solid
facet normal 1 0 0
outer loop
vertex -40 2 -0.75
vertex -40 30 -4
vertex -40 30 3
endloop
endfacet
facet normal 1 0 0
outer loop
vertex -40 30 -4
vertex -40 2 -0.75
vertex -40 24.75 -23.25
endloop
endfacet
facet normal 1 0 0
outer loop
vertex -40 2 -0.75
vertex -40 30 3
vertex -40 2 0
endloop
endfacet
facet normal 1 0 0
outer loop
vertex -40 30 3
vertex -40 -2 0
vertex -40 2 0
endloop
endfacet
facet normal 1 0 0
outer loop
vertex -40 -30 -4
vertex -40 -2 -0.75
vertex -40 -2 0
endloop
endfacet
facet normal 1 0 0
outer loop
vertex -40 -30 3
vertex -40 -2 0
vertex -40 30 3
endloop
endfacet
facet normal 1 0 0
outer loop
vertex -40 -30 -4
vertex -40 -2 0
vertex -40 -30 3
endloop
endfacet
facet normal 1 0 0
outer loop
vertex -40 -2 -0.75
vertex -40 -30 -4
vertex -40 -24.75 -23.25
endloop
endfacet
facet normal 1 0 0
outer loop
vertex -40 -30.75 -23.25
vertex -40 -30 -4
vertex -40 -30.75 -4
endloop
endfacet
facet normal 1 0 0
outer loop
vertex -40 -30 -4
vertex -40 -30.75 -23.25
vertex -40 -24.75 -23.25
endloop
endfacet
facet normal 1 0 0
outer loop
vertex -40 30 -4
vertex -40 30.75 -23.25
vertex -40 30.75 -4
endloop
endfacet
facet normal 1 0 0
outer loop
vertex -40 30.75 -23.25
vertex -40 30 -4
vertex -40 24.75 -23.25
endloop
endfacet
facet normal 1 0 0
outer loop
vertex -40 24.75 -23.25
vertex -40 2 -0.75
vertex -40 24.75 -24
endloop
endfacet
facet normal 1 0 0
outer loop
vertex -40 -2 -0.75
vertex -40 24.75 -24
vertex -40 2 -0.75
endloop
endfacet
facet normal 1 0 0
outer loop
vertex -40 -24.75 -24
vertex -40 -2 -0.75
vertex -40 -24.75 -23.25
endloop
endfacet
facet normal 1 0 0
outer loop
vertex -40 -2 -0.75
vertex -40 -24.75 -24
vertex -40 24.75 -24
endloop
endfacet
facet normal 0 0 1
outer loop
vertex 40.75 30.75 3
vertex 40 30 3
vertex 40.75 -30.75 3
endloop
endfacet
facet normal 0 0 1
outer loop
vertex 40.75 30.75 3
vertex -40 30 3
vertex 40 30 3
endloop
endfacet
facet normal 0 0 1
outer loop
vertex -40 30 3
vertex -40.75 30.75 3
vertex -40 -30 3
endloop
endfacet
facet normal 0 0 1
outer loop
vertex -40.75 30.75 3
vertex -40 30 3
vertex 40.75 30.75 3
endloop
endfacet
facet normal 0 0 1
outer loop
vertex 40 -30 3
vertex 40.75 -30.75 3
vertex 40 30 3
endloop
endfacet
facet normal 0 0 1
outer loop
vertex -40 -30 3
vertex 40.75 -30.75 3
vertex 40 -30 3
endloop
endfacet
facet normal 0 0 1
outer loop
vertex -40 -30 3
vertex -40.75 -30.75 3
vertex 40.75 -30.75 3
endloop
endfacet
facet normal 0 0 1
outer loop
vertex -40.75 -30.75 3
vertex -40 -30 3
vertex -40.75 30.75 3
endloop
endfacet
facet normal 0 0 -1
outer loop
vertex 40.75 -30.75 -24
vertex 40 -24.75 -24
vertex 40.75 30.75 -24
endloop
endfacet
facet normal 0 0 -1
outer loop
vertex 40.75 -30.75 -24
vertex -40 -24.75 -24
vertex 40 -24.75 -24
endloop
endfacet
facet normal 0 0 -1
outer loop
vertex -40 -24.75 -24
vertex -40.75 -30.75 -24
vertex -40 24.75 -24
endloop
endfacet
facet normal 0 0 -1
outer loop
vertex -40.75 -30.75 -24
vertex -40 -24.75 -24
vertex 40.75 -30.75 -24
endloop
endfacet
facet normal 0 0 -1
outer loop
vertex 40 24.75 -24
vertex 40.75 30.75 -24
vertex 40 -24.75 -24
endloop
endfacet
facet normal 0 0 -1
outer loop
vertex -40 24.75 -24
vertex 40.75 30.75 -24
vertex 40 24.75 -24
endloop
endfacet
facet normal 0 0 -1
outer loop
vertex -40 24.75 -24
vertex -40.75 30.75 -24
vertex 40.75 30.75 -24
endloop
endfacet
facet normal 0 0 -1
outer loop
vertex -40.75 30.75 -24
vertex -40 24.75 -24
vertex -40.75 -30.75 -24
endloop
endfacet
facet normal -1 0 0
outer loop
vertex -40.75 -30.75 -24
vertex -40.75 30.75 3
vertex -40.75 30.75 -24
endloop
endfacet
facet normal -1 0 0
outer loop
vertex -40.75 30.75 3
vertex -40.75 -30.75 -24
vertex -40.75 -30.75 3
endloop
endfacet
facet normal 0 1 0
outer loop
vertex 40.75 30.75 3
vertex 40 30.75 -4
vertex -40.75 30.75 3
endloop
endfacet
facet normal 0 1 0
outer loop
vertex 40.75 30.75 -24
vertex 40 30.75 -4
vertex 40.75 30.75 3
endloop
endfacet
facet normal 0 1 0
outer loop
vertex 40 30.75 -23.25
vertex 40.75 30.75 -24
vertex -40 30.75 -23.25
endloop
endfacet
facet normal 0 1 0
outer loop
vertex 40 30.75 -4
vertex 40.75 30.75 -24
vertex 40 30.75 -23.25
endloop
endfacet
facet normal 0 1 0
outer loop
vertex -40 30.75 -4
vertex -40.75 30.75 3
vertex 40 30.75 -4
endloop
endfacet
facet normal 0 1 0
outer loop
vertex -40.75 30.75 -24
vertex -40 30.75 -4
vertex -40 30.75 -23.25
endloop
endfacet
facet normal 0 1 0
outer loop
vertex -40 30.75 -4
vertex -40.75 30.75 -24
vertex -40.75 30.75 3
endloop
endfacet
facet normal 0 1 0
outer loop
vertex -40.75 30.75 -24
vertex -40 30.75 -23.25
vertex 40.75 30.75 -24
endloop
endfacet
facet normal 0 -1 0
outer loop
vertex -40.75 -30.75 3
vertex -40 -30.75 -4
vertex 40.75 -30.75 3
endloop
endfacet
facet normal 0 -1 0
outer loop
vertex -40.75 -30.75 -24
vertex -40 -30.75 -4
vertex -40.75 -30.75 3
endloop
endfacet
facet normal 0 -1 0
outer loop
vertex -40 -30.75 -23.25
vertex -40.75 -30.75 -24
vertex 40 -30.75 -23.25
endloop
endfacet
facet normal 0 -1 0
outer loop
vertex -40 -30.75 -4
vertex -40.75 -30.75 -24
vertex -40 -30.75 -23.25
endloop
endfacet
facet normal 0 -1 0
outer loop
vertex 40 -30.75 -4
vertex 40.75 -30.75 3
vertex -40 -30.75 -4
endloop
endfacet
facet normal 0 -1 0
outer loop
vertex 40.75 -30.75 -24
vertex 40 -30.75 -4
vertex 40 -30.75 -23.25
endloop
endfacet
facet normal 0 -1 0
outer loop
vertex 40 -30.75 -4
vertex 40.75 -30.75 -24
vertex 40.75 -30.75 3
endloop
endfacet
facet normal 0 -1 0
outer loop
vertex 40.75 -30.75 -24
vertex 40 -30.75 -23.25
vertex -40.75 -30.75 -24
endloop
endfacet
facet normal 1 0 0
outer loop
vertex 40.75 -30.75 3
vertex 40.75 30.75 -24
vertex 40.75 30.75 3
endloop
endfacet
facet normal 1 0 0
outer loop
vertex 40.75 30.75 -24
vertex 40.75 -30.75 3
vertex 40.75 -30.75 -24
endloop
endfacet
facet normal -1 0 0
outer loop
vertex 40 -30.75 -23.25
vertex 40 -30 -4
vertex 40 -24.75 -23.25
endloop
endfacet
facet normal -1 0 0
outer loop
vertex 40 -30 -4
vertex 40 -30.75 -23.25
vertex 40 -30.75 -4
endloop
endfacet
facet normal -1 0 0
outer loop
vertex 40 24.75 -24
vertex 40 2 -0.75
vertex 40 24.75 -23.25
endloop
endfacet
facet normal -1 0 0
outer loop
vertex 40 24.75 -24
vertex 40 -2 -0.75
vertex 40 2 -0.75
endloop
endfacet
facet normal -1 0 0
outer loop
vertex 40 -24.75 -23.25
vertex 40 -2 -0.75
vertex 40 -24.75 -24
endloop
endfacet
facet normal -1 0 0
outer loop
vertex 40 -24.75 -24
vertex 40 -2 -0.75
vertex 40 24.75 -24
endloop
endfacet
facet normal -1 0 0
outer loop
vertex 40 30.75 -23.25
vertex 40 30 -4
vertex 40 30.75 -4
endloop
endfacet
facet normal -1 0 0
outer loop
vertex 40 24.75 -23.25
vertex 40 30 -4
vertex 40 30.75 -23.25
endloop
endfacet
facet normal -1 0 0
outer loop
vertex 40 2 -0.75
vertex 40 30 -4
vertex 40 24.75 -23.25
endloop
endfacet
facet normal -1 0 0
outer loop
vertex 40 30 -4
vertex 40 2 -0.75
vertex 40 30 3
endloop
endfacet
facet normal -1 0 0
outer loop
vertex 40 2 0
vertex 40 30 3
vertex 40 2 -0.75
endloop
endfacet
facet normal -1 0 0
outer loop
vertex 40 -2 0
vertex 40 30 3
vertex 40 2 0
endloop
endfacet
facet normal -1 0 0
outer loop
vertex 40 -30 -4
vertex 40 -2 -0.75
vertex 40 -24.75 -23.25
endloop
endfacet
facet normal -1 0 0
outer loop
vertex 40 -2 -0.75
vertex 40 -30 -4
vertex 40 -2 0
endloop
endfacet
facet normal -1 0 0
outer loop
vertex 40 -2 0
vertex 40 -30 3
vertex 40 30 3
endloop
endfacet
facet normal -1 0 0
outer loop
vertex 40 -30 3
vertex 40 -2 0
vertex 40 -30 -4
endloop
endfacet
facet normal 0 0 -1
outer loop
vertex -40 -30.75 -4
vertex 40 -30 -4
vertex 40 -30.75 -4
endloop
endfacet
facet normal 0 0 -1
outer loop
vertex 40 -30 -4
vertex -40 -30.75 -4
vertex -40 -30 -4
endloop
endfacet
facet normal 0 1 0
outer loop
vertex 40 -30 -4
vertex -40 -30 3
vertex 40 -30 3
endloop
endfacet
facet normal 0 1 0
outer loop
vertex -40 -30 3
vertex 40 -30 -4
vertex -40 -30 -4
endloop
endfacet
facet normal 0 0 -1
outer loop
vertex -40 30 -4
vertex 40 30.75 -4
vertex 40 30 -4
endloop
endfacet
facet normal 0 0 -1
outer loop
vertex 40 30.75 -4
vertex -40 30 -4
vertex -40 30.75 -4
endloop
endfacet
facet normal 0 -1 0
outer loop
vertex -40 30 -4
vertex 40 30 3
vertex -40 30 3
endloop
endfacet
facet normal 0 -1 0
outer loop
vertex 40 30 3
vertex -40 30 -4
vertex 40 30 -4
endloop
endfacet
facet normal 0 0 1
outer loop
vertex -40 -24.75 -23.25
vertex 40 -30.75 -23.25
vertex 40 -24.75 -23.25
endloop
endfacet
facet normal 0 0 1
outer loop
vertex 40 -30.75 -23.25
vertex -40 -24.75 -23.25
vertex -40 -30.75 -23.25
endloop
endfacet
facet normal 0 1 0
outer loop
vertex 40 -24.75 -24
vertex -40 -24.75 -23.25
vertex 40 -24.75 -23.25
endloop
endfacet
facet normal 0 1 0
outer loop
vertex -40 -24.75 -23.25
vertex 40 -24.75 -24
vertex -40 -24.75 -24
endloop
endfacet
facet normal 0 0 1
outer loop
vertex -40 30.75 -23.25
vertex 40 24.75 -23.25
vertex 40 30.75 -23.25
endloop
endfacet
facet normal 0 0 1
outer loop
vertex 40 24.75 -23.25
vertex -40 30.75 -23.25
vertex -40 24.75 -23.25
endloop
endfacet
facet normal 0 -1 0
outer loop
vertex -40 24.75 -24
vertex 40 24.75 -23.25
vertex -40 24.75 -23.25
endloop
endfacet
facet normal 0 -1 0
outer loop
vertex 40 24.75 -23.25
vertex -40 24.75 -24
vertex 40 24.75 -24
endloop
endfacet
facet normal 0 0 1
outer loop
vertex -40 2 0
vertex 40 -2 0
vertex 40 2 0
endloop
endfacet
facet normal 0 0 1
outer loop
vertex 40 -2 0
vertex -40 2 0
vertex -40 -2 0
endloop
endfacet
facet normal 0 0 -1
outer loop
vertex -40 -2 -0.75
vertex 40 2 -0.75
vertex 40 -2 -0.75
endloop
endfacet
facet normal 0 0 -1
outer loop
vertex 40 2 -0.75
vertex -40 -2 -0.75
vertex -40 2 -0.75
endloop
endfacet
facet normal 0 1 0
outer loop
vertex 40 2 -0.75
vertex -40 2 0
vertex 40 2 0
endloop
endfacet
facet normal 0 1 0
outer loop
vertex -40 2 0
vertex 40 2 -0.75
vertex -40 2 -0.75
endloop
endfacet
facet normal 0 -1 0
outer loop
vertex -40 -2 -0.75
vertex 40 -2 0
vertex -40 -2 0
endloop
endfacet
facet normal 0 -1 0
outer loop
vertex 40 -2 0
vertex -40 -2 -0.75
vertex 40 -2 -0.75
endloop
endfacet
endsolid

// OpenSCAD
sheet_thickness = 3/4;

// "standard" inch measurements

foot = 12;
feet = 12;
left = -1;
right = 1;

// full
mattress_width = 54;
mattress_length = 75;

// twin
mattress_width = 39;
mattress_length = 75;

// queen
mattress_width = 60;
mattress_length = 80;

mattress_thickness = 6;

// widths are frame opening, not drawer
drawer_width  = [39 + 3/8, 29 + 1/2, 19 + 5/8]; // large, medium, small
drawer_depth = 22 + 7/8;
drawer_height = 6 + 1/4;
drawer_spacing = 2;

bed_height = 24;

num_drawers = (bed_height+drawer_spacing)/(drawer_height+drawer_spacing);
height_remain = bed_height - (floor(num_drawers)*(drawer_height+drawer_spacing) - drawer_spacing);
echo(num_drawers, " high, ", height_remain, "in left over");

center_support_length = mattress_length;
center_support_width = 4;

module drawer(size=0) {
  cube([drawer_width[size],drawer_depth,drawer_height],center=true);
}

% translate([0,0,mattress_thickness/2])
  cube([mattress_length,mattress_width,mattress_thickness],center=true);

// center support (for wider beds)
translate([0,0,-sheet_thickness/2])
  cube([center_support_length,center_support_width,sheet_thickness],center=true);

// headboard, footboard
for(end=[left,right]) {
  translate([(mattress_length/2+sheet_thickness/2)*end,0,-bed_height/2+mattress_thickness/4])
    cube([sheet_thickness,mattress_width+sheet_thickness*2,bed_height+mattress_thickness/2],center=true);
}

// side rails
side_rail_height = 4 + mattress_thickness/2;
for(side=[left,right]) {
  translate([0,(mattress_width/2+sheet_thickness/2)*side,-side_rail_height/2+mattress_thickness/2])
    cube([mattress_length+sheet_thickness*2,sheet_thickness,side_rail_height],center=true);
}

/*
translate([-mattress_length/2,0,0]) {
  translate([drawer_width[1]/2,0,0]) {
    for(side=[left,right]) {
      for(i=[0:num_drawers-1]) {
        translate([0,(mattress_width/2-drawer_depth/2)*side,-height_remain-i*(drawer_height+drawer_spacing)-drawer_height/2]) {
          % drawer(1);
        }
      }
    }
    for(side=[left,right]) {
      translate([(drawer_width[1]/2+sheet_thickness/2)*side,0,-bed_height/2])
        cube([sheet_thickness,mattress_width+sheet_thickness*2,bed_height],center=true);
    }
  }
}

translate([-mattress_length/2,0,0]) {
  translate([drawer_width[1]+sheet_thickness+drawer_width[1]/2,0,0]) {
    for(side=[left,right]) {
      translate([(drawer_width[1]/2+sheet_thickness/2)*side,0,-bed_height/2])
        cube([sheet_thickness,mattress_width+sheet_thickness*2,bed_height],center=true);
    }
  }
}
*/

side_brace_width = 6;
for(side=[left,right]) {
  translate([0,(mattress_width/2-side_brace_width/2+sheet_thickness)*side,-bed_height+sheet_thickness/2]) {
    cube([mattress_length+sheet_thickness*2,side_brace_width,sheet_thickness],center=true);
  }
}
